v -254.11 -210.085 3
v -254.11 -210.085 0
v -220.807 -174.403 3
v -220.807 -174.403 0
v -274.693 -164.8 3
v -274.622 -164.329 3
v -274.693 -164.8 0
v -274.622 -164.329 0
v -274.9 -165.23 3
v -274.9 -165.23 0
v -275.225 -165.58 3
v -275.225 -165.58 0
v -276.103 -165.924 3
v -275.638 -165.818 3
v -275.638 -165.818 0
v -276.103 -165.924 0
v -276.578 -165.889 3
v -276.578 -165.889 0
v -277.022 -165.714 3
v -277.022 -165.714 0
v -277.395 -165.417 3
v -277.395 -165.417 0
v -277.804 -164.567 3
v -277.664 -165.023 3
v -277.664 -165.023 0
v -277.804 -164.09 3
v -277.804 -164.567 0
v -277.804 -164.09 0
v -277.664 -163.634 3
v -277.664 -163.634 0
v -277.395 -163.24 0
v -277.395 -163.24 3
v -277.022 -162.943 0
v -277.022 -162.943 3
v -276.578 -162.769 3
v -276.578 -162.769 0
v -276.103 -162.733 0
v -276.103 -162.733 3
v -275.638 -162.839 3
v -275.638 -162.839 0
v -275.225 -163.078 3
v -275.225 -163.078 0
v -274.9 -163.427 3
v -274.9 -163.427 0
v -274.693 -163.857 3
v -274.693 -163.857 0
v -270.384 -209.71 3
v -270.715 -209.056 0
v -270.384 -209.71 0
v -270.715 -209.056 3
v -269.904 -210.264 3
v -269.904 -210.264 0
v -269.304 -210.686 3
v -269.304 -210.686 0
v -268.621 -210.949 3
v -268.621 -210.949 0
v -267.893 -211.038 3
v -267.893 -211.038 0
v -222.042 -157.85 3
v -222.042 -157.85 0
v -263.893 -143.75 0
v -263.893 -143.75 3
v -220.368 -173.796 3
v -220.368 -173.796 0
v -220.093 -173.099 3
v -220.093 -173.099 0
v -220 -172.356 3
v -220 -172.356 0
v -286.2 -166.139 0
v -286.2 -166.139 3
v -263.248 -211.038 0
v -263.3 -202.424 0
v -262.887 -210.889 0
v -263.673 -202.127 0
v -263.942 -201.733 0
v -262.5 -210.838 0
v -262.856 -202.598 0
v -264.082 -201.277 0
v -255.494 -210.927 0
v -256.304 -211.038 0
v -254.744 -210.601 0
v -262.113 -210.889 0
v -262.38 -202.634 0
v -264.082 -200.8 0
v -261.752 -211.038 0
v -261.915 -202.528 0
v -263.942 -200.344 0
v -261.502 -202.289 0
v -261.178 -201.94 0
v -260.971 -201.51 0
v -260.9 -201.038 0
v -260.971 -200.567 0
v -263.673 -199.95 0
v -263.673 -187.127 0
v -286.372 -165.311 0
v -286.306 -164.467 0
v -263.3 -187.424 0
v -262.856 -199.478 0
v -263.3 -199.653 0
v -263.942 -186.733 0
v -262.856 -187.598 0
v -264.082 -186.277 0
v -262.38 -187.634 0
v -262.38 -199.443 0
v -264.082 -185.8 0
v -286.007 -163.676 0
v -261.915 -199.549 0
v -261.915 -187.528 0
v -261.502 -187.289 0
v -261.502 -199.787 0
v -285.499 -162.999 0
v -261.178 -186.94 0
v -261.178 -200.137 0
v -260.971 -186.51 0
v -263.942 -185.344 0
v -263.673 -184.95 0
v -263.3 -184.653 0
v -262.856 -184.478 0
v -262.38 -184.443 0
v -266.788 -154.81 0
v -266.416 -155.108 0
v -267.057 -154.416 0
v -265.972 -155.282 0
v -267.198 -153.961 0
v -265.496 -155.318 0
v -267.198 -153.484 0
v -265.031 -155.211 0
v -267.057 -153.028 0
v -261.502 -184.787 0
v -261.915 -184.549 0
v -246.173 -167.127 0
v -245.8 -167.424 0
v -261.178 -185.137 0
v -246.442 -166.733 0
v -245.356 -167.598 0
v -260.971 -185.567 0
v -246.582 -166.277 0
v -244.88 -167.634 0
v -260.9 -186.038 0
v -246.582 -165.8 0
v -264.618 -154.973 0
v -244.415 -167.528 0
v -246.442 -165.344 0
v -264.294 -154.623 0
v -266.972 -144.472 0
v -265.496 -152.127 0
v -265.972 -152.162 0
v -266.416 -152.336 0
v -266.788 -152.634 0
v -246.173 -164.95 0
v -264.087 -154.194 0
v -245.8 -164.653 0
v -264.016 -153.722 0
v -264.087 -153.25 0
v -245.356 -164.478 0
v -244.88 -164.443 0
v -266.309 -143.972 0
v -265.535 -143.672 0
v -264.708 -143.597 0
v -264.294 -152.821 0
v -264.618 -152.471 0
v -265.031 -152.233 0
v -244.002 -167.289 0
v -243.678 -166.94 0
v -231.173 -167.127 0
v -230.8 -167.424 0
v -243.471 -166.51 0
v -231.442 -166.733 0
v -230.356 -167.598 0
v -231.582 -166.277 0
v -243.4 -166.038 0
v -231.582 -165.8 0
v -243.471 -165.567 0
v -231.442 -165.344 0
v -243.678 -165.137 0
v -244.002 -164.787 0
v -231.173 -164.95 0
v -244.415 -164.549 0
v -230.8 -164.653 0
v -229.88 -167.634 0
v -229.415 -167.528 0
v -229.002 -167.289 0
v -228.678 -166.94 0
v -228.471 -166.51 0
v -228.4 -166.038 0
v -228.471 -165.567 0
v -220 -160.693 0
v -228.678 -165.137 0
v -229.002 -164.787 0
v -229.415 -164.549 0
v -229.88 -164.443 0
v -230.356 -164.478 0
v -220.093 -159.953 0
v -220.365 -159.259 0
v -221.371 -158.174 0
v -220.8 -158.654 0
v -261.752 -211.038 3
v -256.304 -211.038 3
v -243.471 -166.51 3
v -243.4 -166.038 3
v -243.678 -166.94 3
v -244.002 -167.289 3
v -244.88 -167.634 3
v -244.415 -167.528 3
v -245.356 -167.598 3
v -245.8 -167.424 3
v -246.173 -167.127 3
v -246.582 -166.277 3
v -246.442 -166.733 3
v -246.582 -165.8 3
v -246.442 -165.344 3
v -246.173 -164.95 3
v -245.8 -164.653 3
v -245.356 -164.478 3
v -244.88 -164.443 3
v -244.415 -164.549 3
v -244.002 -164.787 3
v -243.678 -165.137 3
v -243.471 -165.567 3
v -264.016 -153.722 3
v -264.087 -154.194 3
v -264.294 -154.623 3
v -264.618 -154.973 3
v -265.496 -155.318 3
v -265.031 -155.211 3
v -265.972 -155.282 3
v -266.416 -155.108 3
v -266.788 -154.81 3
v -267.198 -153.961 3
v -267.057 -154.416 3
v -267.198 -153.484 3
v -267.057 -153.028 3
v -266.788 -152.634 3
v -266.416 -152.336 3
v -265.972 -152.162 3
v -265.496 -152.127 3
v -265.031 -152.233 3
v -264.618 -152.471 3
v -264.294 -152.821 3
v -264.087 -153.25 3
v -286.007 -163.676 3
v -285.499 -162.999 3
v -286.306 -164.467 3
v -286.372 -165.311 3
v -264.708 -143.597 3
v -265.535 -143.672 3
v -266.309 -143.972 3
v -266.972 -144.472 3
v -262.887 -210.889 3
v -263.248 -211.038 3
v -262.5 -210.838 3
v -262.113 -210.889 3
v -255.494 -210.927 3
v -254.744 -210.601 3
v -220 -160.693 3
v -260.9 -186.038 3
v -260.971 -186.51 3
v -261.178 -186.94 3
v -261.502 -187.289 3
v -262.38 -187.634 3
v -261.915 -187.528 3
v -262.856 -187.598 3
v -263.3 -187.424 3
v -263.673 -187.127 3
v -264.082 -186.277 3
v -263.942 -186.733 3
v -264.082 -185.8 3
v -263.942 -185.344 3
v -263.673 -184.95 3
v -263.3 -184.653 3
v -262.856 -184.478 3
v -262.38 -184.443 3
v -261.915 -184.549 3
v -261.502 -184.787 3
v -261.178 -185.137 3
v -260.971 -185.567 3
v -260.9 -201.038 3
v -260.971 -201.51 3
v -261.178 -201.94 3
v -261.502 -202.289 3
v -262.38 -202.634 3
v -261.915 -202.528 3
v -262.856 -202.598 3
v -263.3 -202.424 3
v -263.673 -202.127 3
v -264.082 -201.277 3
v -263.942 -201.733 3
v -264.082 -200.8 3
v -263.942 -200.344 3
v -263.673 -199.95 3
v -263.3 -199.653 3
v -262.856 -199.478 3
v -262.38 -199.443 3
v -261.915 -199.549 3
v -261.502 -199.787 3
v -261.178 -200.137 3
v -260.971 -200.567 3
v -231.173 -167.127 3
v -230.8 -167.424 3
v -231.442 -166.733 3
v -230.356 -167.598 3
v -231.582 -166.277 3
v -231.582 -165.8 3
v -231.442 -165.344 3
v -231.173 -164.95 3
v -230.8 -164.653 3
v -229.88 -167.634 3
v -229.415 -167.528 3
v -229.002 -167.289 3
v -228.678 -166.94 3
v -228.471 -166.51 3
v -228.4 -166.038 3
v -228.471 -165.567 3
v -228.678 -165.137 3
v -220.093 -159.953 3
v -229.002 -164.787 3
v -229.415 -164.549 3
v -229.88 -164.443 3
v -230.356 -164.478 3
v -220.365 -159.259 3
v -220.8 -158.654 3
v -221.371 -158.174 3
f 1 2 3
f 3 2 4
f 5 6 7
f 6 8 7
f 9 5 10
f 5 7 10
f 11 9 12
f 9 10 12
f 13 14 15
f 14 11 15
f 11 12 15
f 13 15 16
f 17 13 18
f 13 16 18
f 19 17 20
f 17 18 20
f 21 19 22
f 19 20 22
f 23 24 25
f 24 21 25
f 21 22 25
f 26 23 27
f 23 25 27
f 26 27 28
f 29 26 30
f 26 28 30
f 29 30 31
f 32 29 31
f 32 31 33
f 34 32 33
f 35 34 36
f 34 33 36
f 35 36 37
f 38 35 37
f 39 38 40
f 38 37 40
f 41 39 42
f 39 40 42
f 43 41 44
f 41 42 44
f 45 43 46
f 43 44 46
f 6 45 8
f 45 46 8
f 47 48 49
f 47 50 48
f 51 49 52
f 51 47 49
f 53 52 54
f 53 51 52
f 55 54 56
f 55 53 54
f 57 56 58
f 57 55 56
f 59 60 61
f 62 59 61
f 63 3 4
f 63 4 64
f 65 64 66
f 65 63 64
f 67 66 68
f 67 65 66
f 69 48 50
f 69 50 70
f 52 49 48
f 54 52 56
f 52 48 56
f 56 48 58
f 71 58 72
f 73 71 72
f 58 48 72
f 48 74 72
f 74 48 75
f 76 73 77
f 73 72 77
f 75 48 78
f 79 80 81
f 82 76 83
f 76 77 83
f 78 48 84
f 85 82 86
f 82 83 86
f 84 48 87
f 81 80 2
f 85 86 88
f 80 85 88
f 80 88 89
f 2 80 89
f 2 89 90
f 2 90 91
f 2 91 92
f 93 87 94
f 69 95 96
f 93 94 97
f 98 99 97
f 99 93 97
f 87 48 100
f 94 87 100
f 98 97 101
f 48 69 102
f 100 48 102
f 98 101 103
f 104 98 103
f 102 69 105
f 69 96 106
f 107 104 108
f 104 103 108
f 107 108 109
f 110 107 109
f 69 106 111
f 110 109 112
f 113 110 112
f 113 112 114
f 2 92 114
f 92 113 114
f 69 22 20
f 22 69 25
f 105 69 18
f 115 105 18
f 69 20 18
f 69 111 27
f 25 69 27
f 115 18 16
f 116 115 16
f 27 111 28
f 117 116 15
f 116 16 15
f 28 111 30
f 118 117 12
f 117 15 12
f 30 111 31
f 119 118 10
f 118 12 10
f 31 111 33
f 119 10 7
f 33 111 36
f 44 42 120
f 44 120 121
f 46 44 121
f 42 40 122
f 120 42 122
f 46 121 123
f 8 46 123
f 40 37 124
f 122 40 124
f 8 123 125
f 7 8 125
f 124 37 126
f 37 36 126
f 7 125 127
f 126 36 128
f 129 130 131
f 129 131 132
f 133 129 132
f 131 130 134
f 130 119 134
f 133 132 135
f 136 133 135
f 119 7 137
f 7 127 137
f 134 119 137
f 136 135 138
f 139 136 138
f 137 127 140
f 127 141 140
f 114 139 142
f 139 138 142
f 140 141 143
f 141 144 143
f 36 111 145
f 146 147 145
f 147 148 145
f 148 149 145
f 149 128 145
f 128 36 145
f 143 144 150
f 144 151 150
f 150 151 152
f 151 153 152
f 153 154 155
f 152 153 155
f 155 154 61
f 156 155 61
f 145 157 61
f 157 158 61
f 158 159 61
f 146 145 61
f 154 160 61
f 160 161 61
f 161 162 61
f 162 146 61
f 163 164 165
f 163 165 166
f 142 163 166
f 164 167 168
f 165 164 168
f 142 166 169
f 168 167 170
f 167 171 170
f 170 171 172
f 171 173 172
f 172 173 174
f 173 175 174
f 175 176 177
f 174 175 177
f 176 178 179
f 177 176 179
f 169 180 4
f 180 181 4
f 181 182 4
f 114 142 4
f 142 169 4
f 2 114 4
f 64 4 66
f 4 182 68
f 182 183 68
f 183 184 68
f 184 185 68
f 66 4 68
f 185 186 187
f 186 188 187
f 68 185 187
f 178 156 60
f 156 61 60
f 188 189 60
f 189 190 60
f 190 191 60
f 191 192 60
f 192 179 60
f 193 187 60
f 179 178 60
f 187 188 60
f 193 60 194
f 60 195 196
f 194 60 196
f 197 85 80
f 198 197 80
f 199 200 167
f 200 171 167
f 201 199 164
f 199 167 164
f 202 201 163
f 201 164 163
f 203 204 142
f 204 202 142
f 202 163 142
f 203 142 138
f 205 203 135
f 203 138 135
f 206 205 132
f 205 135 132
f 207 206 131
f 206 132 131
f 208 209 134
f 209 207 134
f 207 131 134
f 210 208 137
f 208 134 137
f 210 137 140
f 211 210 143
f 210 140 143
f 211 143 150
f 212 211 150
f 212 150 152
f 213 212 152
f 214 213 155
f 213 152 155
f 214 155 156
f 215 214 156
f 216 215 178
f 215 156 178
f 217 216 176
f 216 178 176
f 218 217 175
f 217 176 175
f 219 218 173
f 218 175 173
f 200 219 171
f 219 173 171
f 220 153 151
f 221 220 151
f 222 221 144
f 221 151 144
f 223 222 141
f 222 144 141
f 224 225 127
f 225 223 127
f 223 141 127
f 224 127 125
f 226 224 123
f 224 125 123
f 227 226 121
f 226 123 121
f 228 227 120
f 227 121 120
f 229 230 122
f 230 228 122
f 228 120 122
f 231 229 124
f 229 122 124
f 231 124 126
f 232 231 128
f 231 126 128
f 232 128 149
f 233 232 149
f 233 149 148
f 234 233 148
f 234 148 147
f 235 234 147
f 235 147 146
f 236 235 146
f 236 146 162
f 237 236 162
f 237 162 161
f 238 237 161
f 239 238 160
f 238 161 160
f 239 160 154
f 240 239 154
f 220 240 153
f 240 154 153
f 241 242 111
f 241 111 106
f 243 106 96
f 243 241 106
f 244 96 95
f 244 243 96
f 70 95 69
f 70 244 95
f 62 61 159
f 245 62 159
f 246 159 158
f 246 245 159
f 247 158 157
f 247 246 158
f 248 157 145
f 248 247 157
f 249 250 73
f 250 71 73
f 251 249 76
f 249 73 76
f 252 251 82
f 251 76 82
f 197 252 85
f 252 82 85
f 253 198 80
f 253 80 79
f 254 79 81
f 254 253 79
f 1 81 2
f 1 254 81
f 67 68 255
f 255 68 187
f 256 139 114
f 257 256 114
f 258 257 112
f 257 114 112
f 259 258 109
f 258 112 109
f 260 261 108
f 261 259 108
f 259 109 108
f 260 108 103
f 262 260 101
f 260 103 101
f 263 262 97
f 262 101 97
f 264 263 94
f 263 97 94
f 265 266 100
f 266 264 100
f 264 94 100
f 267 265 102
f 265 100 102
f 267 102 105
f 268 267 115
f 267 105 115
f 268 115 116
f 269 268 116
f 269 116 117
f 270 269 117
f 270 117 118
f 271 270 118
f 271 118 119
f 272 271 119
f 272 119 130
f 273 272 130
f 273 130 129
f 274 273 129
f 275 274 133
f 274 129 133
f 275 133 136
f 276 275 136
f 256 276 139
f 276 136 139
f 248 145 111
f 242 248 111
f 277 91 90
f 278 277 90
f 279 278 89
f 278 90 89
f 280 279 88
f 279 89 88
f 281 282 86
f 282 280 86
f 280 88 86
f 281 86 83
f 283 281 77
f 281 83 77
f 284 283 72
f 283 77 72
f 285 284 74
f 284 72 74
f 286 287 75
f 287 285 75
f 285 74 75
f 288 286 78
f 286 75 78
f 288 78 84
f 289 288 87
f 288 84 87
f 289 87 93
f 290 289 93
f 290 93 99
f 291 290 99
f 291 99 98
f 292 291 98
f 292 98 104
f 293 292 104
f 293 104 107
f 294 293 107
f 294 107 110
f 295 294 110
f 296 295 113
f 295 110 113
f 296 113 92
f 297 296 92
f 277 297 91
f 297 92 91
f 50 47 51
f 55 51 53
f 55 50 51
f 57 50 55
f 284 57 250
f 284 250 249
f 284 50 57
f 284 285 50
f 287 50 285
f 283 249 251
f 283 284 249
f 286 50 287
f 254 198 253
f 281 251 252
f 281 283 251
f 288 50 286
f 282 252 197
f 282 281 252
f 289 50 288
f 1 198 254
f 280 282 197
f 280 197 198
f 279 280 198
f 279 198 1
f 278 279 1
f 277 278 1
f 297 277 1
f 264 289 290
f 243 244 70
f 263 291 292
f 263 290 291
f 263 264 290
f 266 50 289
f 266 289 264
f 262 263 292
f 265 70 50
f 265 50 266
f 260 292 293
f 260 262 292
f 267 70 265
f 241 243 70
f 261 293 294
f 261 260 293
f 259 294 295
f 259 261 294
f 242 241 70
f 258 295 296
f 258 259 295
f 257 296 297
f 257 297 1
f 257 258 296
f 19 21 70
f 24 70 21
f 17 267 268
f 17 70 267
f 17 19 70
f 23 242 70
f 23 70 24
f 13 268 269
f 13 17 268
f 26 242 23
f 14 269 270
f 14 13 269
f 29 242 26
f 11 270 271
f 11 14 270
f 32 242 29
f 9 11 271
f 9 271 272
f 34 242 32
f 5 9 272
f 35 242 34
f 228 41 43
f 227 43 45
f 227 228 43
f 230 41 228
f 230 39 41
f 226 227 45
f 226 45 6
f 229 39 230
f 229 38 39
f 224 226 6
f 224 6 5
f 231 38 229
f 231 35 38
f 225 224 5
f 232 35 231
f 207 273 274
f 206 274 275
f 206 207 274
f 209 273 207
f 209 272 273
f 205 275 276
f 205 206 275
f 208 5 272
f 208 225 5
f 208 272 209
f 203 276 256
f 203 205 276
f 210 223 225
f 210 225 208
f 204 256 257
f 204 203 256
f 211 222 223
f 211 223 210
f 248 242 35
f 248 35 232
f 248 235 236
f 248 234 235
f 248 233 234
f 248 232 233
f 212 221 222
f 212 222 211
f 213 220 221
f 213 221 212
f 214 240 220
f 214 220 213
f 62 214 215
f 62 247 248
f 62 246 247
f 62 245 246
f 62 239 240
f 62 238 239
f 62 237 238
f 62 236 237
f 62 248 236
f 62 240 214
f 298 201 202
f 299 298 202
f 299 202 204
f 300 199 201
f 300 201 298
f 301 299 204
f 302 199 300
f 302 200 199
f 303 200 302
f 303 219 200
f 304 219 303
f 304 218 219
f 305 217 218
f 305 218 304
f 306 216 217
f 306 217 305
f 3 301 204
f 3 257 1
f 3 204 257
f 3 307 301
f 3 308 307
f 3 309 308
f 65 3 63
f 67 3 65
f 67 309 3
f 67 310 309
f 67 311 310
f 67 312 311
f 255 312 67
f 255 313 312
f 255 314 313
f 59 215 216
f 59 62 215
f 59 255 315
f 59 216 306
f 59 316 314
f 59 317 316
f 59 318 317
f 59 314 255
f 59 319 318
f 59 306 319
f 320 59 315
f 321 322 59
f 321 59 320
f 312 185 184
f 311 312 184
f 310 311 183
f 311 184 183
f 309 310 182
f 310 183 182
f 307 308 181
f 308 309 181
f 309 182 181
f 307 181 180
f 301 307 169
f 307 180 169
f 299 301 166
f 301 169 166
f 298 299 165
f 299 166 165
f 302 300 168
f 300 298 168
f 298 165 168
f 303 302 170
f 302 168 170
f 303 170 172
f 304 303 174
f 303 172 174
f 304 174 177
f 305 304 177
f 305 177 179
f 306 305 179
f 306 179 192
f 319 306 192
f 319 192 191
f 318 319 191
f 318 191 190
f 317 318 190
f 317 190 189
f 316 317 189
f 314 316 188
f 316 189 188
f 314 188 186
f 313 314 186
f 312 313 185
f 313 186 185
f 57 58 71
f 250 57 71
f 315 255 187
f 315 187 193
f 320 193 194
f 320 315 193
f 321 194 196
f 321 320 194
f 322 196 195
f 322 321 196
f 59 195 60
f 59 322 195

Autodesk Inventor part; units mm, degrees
ref_plane "YZ Plane" through (0, 0, 0) normal (1, 0, 0) x (0, 1, 0)
ref_plane "XZ Plane" through (0, 0, 0) normal (0, 1, 0) x (-1, 0, 0)
ref_plane "XY Plane" through (0, 0, 0) normal (0, 0, 1) x (1, 0, 0)
sketch "スケッチ1" plane through (0, 0, 0) normal (0, 0, 1) x (1, 0, 0)
  line L0 (67.5, 17.5) -> (-67.5, 17.5) construction
  line L1 (-67.5, 17.5) -> (-67.5, -17.5) construction
  line L2 (-67.5, -17.5) -> (67.5, -17.5) construction
  line L3 (67.5, -17.5) -> (67.5, 17.5) construction
  line L4 (67.5, 17.5) -> (-67.5, -17.5) construction
  line L5 (-67.5, 17.5) -> (67.5, -17.5) construction
  circle A0 centre (-60, 35) radius 1.6 construction
  circle A1 centre (-70, 35) radius 1.6 construction
  line L6 (-77.5, 27.5) -> (-53, 27.5) construction
  line L7 (-53, 27.5) -> (-53, 42.5) construction
  line L8 (-53, 42.5) -> (-80, 42.5) construction
  line L9 (-77.5, 27.5) -> (-77.5, -27.5) construction
  line L10 (-77.5, -27.5) -> (-53, -27.5) construction
  line L11 (-53, -27.5) -> (-53, -42.5) construction
  line L12 (-53, -42.5) -> (-80, -42.5) construction
  circle A2 centre (-60, -35) radius 1.6 construction
  circle A3 centre (-70, -35) radius 1.6 construction
  circle A4 centre (-80, -35) radius 1.6 construction
  line L13 (124.2308, -31.7536) -> (484.5935, -392.1164)
  line L14 (484.5935, -392.1164) -> (488.7129, -553.575)
  line L15 (-80, 21.2868) -> (-468.838, -367.5512) construction
  line L16 (-468.838, -367.5512) -> (-479.4446, -356.9446)
  line L17 (-479.4446, -356.9446) -> (-90.6066, 31.8934) construction
  line L18 (-90.6066, 31.8934) -> (-80, 21.2868) construction
  line L19 (-80, 42.5) -> (-80, 5.3052) construction
  circle A5 centre (-92.3744, 19.519) radius 1.6 construction
  circle A6 centre (-102.981, 8.9124) radius 1.6 construction
  circle A7 centre (-113.5876, -1.6942) radius 1.6 construction
  line L20 (-92.3744, 19.519) -> (-113.5876, -1.6942) construction
  circle A8 centre (-437.941, -345.2067) radius 1.6
  circle A9 centre (-426.1402, -333.4059) radius 1.6
  line L21 (-388.4374, -772.2067) -> (-358.1265, -754.7067) construction
  line L22 (-358.1265, -754.7067) -> (-425.6265, -637.7933) construction
  line L23 (-455.9374, -655.2933) -> (-358.1265, -754.7067) construction
  line L24 (-388.4374, -772.2067) -> (-425.6265, -637.7933) construction
  line L25 (-455.9374, -655.2933) -> (-388.4374, -772.2067) construction
  line L26 (-425.6265, -637.7933) -> (-455.9374, -655.2933) construction
  line L27 (455.9374, -655.2933) -> (425.6265, -637.7933) construction
  line L28 (425.6265, -637.7933) -> (358.1265, -754.7067) construction
  line L29 (388.4374, -772.2067) -> (425.6265, -637.7933) construction
  line L30 (455.9374, -655.2933) -> (358.1265, -754.7067) construction
  line L31 (388.4374, -772.2067) -> (455.9374, -655.2933) construction
  line L32 (358.1265, -754.7067) -> (388.4374, -772.2067) construction
  line L33 (0, 0) -> (0, -263.4473) construction
  circle A10 centre (80, -35) radius 1.6 construction
  line L34 (67.5, 17.5) -> (67.5, -17.5) construction
  line L35 (77.5, 27.5) -> (53, 27.5) construction
  line L36 (77.5, 27.5) -> (77.5, -27.5) construction
  line L37 (77.5, -27.5) -> (53, -27.5) construction
  circle A11 centre (60, -35) radius 1.6 construction
  circle A12 centre (70, -35) radius 1.6 construction
  line L38 (53, -27.5) -> (53, -42.5) construction
  line L39 (53, -42.5) -> (80, -42.5) construction
  circle A13 centre (60, 35) radius 1.6 construction
  circle A14 centre (70, 35) radius 1.6 construction
  line L40 (80, 42.5) -> (80, 5.3052) construction
  line L41 (53, 42.5) -> (80, 42.5) construction
  line L42 (53, 27.5) -> (53, 42.5) construction
  line L43 (-392.0976, -785.867) -> (-404.3476, -764.6493)
  line L44 (-388.4374, -772.2067) -> (-358.1265, -754.7067) construction
  line L45 (-392.0976, -785.867) -> (-344.4662, -758.367)
  circle A15 centre (-336.7211, -756.782) radius 1.6
  circle A16 centre (-341.7211, -748.1218) radius 1.6
  line L46 (-343.7259, -729.6493) -> (-330.2259, -753.032)
  circle A17 centre (-346.7211, -739.4615) radius 1.6
  line L47 (-356.7162, -737.1493) -> (-343.7259, -729.6493)
  line L48 (-344.4662, -758.367) -> (-356.7162, -737.1493)
  circle A18 centre (-407.3428, -774.4615) radius 1.6
  circle A19 centre (-402.3428, -783.1218) radius 1.6
  line L49 (-404.3476, -764.6493) -> (-417.338, -772.1493)
  line L50 (-417.338, -772.1493) -> (-405.4634, -792.7168)
  line L51 (-403.838, -795.532) -> (-371.6264, -776.9346) construction
  line L52 (-425.6265, -637.7933) -> (-455.9374, -655.2933) construction
  line L53 (-409.7162, -645.3507) -> (-396.7259, -637.8507)
  circle A20 centre (-406.7211, -635.5385) radius 1.6
  line L54 (-455.9374, -655.2933) -> (-425.6265, -637.7933) construction
  circle A21 centre (-411.7211, -626.8782) radius 1.6
  line L55 (-469.5976, -651.633) -> (-421.9662, -624.133)
  line L56 (-421.9662, -624.133) -> (-409.7162, -645.3507)
  line L57 (-396.7259, -637.8507) -> (-410.2259, -614.468)
  circle A22 centre (-416.7211, -618.218) radius 1.6
  line L58 (-469.5976, -651.633) -> (-457.3476, -672.8507)
  circle A23 centre (-467.3428, -670.5385) radius 1.6
  circle A24 centre (-472.3428, -661.8782) radius 1.6
  line L59 (-483.838, -656.968) -> (-451.6264, -638.3706) construction
  line L60 (-470.338, -680.3507) -> (-483.838, -656.968)
  line L61 (-457.3476, -672.8507) -> (-470.338, -680.3507)
  line L62 (469.5976, -651.633) -> (457.3476, -672.8507)
  line L63 (455.9374, -655.2933) -> (425.6265, -637.7933) construction
  line L64 (469.5976, -651.633) -> (421.9662, -624.133)
  circle A25 centre (416.7211, -618.218) radius 1.6
  circle A26 centre (411.7211, -626.8782) radius 1.6
  line L65 (396.7259, -637.8507) -> (410.2259, -614.468)
  circle A27 centre (406.7211, -635.5385) radius 1.6
  line L66 (409.7162, -645.3507) -> (396.7259, -637.8507)
  line L67 (421.9662, -624.133) -> (409.7162, -645.3507)
  circle A28 centre (467.3428, -670.5385) radius 1.6
  circle A29 centre (472.3428, -661.8782) radius 1.6
  line L68 (457.3476, -672.8507) -> (470.338, -680.3507)
  line L69 (470.338, -680.3507) -> (483.838, -656.968)
  line L70 (483.838, -656.968) -> (451.6264, -638.3706) construction
  line L71 (358.1265, -754.7067) -> (388.4374, -772.2067) construction
  line L72 (356.7162, -737.1493) -> (343.7259, -729.6493)
  circle A30 centre (346.7211, -739.4615) radius 1.6
  line L73 (388.4374, -772.2067) -> (358.1265, -754.7067) construction
  circle A31 centre (341.7211, -748.1218) radius 1.6
  line L74 (392.0976, -785.867) -> (344.4662, -758.367)
  line L75 (344.4662, -758.367) -> (356.7162, -737.1493)
  line L76 (343.7259, -729.6493) -> (330.2259, -753.032)
  circle A32 centre (336.7211, -756.782) radius 1.6
  line L77 (392.0976, -785.867) -> (404.3476, -764.6493)
  circle A33 centre (407.3428, -774.4615) radius 1.6
  circle A34 centre (402.3428, -783.1218) radius 1.6
  line L78 (403.838, -795.532) -> (371.6264, -776.9346) construction
  line L79 (417.338, -772.1493) -> (403.838, -795.532)
  line L80 (404.3476, -764.6493) -> (417.338, -772.1493)
  line L81 (-483.838, -367.5512) -> (-468.838, -367.5512)
  line L82 (-468.838, -367.5512) -> (-468.838, -648.3077) construction
  line L83 (-468.838, -648.3077) -> (-483.838, -648.3077) construction
  line L84 (-483.838, -648.3077) -> (-483.838, -367.5512) construction
  line L85 (-283.2277, -604.4352) -> (-262.2277, -640.8083) construction
  line L86 (345.2492, -497.0108) -> (305.7786, -565.3759) construction
  line L87 (250, -655.004) -> (-250, -655.004) construction
  line L88 (-250, -655.004) -> (-250, -1155.004) construction
  line L89 (-250, -1155.004) -> (250, -1155.004) construction
  line L90 (250, -1155.004) -> (250, -655.004) construction
  line L91 (250, -655.004) -> (-250, -1155.004) construction
  line L92 (-250, -655.004) -> (250, -1155.004) construction
  line L93 (-12.841, -158.5383) -> (15.1134, -158.5383) construction
  circle A35 centre (-3.0548, -432.807) radius 212.5 construction
  line L94 (496.9452, 30.2659) -> (-503.0548, 30.2659) construction
  line L95 (-503.0548, 30.2659) -> (-503.0548, -969.7341) construction
  line L96 (-503.0548, -969.7341) -> (496.9452, -969.7341) construction
  line L97 (496.9452, -969.7341) -> (496.9452, 30.2659) construction
  line L98 (496.9452, 30.2659) -> (-503.0548, -969.7341) construction
  circle A36 centre (-3.0548, -432.807) radius 250 construction
  line L99 (-80, 42.5) -> (-90.6066, 31.8934) construction
  line L100 (-80, 42.5) -> (-118.8909, 3.6091) construction
  line L101 (-118.8909, -6.2904) -> (-113.234, -11.9472) construction
  line L102 (-113.234, -11.9472) -> (-85.3433, -40.263) construction
  arc A37 (-118.8909, 3.6091) -> (-118.8909, -6.2904) centre (-113.9411, -1.3406) ccw construction
  arc A38 (-85.3433, -40.263) -> (-80, -42.5) centre (-80, -35) ccw construction
  line L103 (-80, 42.5) -> (-53, 42.5) construction
  circle A39 centre (-476.338, -638.3077) radius 1.6
  circle A40 centre (-476.338, -623.3077) radius 1.6
  circle A41 centre (-476.338, -608.2553) radius 1.6
  line L104 (-483.838, -656.968) -> (-483.838, -601.2553)
  line L105 (-483.838, -601.2553) -> (-468.838, -601.2553)
  line L106 (-468.838, -601.2553) -> (-415.3976, -610.8357)
  arc A42 (-410.2259, -614.468) -> (-415.3976, -610.8357) centre (-416.7211, -618.218) ccw
  line L107 (-255, -176.0383) -> (-270, -176.0383) construction
  line L108 (-270, -176.0383) -> (-270, -631.0383) construction
  line L109 (-270, -666.0383) -> (-255, -666.0383) construction
  line L110 (-255, -666.0383) -> (-255, -176.0383) construction
  line L111 (-271.0048, -667.7787) -> (-287.7211, -696.7321)
  line L112 (-426.5432, -937.1791) -> (-415.5605, -943.52)
  line L113 (-257.0096, -673.5383) -> (-270, -666.0383) construction
  line L114 (-325.2259, -761.6923) -> (-338.2162, -769.1923) construction
  circle A43 centre (-325.2259, -776.6923) radius 1.6
  circle A44 centre (-332.7259, -789.6827) radius 1.6
  circle A45 centre (-340.2259, -802.673) radius 1.6
  line L115 (-325.2259, -776.6923) -> (-340.2259, -802.673) construction
  line L116 (-330.2259, -753.032) -> (-318.7307, -772.9423)
  line L117 (-318.7307, -780.4423) -> (-333.7307, -806.423)
  line L118 (-400.6724, -796.2707) -> (-341.93, -809.9769)
  arc A46 (-405.4634, -792.7168) -> (-400.6724, -796.2707) centre (-398.9682, -788.9668) ccw
  arc A47 (-341.93, -809.9769) -> (-333.7307, -806.423) centre (-340.2259, -802.673) ccw
  arc A48 (-318.7307, -780.4423) -> (-318.7307, -772.9423) centre (-325.2259, -776.6923) ccw
  circle A49 centre (-268.7259, -678.8314) radius 1.6
  circle A50 centre (-276.2259, -691.8218) radius 1.6
  line L119 (-268.7259, -678.8314) -> (-283.7259, -704.8122) construction
  circle A51 centre (-262.5, -656.0383) radius 1.6
  circle A52 centre (-262.5, -641.0383) radius 1.6
  line L120 (-270, -631.0383) -> (-255, -631.0383)
  line L121 (-287.7211, -696.7321) -> (-274.7307, -704.2321)
  line L122 (-274.7307, -704.2321) -> (-257.0096, -673.5383)
  line L123 (-255, -631.0383) -> (-255, -666.0383)
  arc A53 (-257.0096, -673.5383) -> (-255, -666.0383) centre (-270, -666.0383) ccw
  line L124 (-270, -631.0383) -> (-270, -664.0287)
  line L125 (-287.7211, -696.7321) -> (-426.5432, -937.1791) construction
  arc A54 (-271.0048, -667.7787) -> (-270, -664.0287) centre (-277.5, -664.0287) ccw
  line L126 (-255, -173.5383) -> (255, -173.5383) construction
  line L127 (255, -173.5383) -> (255, -158.5383)
  line L128 (255, -158.5383) -> (-255, -158.5383) construction
  line L129 (-255, -158.5383) -> (-255, -173.5383) construction
  circle A55 centre (-262.5, -186.0383) radius 1.6
  circle A56 centre (-262.5, -201.0383) radius 1.6
  circle A57 centre (-245, -166.0383) radius 1.6
  circle A58 centre (-230, -166.0383) radius 1.6
  circle A59 centre (-276.2221, -164.3287) radius 1.6
  circle A60 centre (-265.6155, -153.7221) radius 1.6
  line L130 (-265.6155, -153.7221) -> (-276.2221, -164.3287) construction
  line L131 (-270, -211.0383) -> (-263.2483, -211.0383)
  line L132 (-255, -211.0383) -> (-220, -173.5383)
  line L133 (-220, -173.5383) -> (-220, -158.5383)
  line L134 (-220, -158.5383) -> (-265.6561, -143.1561)
  line L135 (-270, -211.0383) -> (-286.8467, -164.3467)
  line L136 (-265.6561, -143.1561) -> (-286.8467, -164.3467)
  arc A61 (-263.2483, -211.0383) -> (-261.7517, -211.0383) centre (-262.5, -212.3383) ccw construction
  arc A62 (-261.7517, -211.0383) -> (-263.2483, -211.0383) centre (-262.5, -212.3383) ccw
  line L137 (-263.2483, -211.0383) -> (-261.7517, -211.0383) construction
  line L138 (-261.7517, -211.0383) -> (-255, -211.0383)
  point P0 (-77.5, 0)
  point P1 (0, -470)
  point P2 (-123.8406, -1.3406)
  point P3 (-102.981, 8.9124)
  point P4 (-407.0319, -705)
  point P5 (-407.0319, -705)
  point P6 (407.0319, -705)
  point P7 (407.0319, -705)
  point P8 (77.5, 0)
  point P9 (-368.2819, -772.117)
  point P10 (-385.4668, -784.9254)
  point P11 (-445.7819, -637.883)
  point P12 (445.7819, -637.883)
  point P13 (465.4668, -646.3614)
  point P14 (368.2819, -772.117)
  point P15 (0, -905.004)
  point P16 (-3.0548, -469.7341)
  point P17 (0, -905.004)
  point P18 (-262.5, -666.0383)
  point P19 (0, -158.5383)
  point P20 (-262.5, -176.0383)
  point P21 (-255, -166.0383)
  point P22 (-262.5, -211.0383)
  dimension "d4" = 135
  dimension "d5" = 35
  dimension "d6" = 3.2
  dimension "d7" = 3.2
  dimension "d8" = 10
  dimension "d9" = 15
  dimension "d10" = 10
  dimension "d11" = 7.5
  dimension "d12" = 7
  dimension "d13" = 70
  dimension "d14" = 3.2
  dimension "d15" = 3.2
  dimension "d16" = 3.2
  dimension "d17" = 10
  dimension "d18" = 10
  dimension "d19" = 7
  dimension "d20" = 15
  dimension "d21" = 7.5
  dimension "d22" = 10
  dimension "d23" = 10
  dimension "d24" = 135
  dimension "d25" = 15
  dimension "d26" = 10
  dimension "d27" = 3.2
  dimension "d28" = 3.2
  dimension "d29" = 3.2
  dimension "d30" = 10
  dimension "d31" = 15
  dimension "d32" = 15
  dimension "d33" = 7.5
  dimension "d34" = 45
  dimension "d35" = 3.2
  dimension "d36" = 3.2
  dimension "d37" = 360
  dimension "d38" = 360
  dimension "d39" = 470
  dimension "d40" = 15
  dimension "d41" = 200
  dimension "d42" = 200
  dimension "d43" = 500
  dimension "d44" = 500
  dimension "d46" = 425
  dimension "d47" = 1000
  dimension "d48" = 1000
  dimension "d49" = 42
  dimension "d50" = 500
  dimension "d51" = 7
  dimension "d52" = 7
  dimension "d53" = 3.2
  dimension "d54" = 3.2
  dimension "d55" = 3.2
  dimension "d56" = 15
  dimension "d57" = 15.0524
  dimension "d58" = 7.5
  dimension "d59" = 10
  dimension "d60" = 7
  dimension "d61" = 15
  dimension "d62" = 5
  dimension "d63" = 150
  dimension "d64" = 10
  dimension "d65" = 15
  dimension "d66" = 3.2
  dimension "d67" = 3.2
  dimension "d68" = 3.2
extrude "押し出し1" add sketch "スケッチ1" along normal blind 3 contours L135 L136 L134 L133 L132 L138 A62 L131
fillet "フィレット1" radius 3 6 edges at (-265.6561, -143.1561, 1.5) (-286.8467, -164.3467, 1.5) (-270, -211.0383, 1.5) (-255, -211.0383, 1.5) (-220, -173.5383, 1.5) (-220, -158.5383, 1.5)
properties part number "オムニ_固定具3" material "アルミニウム 6061"
